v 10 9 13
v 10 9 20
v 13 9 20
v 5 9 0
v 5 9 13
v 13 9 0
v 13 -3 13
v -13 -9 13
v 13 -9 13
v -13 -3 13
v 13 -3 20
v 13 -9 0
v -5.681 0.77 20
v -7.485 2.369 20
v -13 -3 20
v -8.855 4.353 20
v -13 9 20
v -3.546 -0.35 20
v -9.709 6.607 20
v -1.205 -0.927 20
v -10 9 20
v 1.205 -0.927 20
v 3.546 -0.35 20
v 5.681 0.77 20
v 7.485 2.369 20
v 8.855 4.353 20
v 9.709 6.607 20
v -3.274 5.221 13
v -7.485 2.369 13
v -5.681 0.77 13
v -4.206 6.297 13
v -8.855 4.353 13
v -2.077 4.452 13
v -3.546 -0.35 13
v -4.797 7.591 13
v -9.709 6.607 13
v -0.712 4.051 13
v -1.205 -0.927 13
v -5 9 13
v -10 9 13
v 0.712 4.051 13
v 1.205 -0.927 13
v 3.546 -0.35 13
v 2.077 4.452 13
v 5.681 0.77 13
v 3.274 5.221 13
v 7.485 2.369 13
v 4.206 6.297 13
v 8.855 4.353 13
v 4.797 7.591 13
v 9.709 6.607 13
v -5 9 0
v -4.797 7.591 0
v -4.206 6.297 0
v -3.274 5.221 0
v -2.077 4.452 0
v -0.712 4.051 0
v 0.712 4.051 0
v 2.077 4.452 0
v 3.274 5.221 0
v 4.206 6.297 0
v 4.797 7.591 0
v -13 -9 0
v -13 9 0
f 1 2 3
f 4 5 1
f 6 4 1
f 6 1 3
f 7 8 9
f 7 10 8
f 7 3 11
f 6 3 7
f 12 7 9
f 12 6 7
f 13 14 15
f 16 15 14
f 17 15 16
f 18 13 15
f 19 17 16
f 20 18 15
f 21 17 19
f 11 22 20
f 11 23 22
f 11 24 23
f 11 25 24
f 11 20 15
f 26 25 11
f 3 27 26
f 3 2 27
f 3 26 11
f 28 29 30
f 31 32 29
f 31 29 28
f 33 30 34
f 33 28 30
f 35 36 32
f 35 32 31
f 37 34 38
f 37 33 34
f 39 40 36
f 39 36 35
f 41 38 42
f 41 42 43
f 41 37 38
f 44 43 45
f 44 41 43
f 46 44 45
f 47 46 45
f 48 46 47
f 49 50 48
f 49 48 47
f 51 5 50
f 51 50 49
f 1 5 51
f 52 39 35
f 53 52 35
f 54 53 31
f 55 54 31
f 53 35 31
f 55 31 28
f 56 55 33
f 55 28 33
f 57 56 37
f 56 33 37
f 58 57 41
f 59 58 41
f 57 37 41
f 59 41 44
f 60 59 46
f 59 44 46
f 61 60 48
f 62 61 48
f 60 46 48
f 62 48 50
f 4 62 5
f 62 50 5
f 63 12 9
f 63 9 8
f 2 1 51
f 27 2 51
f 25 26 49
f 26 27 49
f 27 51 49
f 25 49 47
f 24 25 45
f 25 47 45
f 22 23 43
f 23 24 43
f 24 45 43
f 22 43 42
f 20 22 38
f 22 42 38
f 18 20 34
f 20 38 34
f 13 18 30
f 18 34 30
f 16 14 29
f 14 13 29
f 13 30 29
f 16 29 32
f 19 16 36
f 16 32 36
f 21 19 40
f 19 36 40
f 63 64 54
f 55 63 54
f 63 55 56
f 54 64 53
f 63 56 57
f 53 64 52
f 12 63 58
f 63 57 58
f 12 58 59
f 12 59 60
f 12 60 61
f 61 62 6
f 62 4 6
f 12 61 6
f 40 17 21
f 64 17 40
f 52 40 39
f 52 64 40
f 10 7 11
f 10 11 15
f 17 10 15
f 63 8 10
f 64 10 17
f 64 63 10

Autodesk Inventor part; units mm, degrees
ref_plane "YZ Plane" through (0, 0, 0) normal (1, 0, 0) x (0, 1, 0)
ref_plane "XZ Plane" through (0, 0, 0) normal (0, 1, 0) x (-1, 0, 0)
ref_plane "XY Plane" through (0, 0, 0) normal (0, 0, 1) x (1, 0, 0)
sketch "草图1" plane through (0, 0, 0) normal (0, 0, 1) x (1, 0, 0)
  line L0 (-13, 9) -> (13, 9)
  line L1 (13, 9) -> (13, -9)
  line L2 (13, -9) -> (-13, -9)
  line L3 (-13, -9) -> (-13, 9)
  line L4 (-13, 9) -> (13, -9) construction
  line L5 (13, 9) -> (-13, -9) construction
  point P0 (0, 0)
  dimension "d0" = 26
  dimension "d1" = 18
extrude "拉伸1" add sketch "草图1" along normal blind 13
sketch "草图2" plane through (0, 0, 13) normal (0, 0, 1) x (1, 0, 0)
  line L0 (13, 9) -> (-13, 9) projected
  line L1 (13, -9) -> (13, 9) projected
  line L2 (-13, 9) -> (13, 9)
  line L3 (13, 9) -> (13, -3)
  line L4 (13, -3) -> (-13, -3)
  line L5 (-13, -3) -> (-13, 9)
  arc A0 (-10, 9) -> (10, 9) centre (0, 9) ccw
  point P0 (0, 0)
  point P1 (10, 9)
  dimension "d4" = 12
  dimension "d5" = 20
extrude "拉伸2" add sketch "草图2" along normal blind 7 contours L1 L4 L5 L0 A0
sketch "草图3" plane through (0, 0, 13) normal (0, 0, 1) x (1, 0, 0)
  line L0 (10, 9) -> (-10, 9) projected
  arc A0 (-5, 9) -> (5, 9) centre (0, 9) ccw
  point P0 (0, 0)
  dimension "d8" = 10
extrude "拉伸3" cut sketch "草图3" against normal blind 13
properties part number "2-4"
